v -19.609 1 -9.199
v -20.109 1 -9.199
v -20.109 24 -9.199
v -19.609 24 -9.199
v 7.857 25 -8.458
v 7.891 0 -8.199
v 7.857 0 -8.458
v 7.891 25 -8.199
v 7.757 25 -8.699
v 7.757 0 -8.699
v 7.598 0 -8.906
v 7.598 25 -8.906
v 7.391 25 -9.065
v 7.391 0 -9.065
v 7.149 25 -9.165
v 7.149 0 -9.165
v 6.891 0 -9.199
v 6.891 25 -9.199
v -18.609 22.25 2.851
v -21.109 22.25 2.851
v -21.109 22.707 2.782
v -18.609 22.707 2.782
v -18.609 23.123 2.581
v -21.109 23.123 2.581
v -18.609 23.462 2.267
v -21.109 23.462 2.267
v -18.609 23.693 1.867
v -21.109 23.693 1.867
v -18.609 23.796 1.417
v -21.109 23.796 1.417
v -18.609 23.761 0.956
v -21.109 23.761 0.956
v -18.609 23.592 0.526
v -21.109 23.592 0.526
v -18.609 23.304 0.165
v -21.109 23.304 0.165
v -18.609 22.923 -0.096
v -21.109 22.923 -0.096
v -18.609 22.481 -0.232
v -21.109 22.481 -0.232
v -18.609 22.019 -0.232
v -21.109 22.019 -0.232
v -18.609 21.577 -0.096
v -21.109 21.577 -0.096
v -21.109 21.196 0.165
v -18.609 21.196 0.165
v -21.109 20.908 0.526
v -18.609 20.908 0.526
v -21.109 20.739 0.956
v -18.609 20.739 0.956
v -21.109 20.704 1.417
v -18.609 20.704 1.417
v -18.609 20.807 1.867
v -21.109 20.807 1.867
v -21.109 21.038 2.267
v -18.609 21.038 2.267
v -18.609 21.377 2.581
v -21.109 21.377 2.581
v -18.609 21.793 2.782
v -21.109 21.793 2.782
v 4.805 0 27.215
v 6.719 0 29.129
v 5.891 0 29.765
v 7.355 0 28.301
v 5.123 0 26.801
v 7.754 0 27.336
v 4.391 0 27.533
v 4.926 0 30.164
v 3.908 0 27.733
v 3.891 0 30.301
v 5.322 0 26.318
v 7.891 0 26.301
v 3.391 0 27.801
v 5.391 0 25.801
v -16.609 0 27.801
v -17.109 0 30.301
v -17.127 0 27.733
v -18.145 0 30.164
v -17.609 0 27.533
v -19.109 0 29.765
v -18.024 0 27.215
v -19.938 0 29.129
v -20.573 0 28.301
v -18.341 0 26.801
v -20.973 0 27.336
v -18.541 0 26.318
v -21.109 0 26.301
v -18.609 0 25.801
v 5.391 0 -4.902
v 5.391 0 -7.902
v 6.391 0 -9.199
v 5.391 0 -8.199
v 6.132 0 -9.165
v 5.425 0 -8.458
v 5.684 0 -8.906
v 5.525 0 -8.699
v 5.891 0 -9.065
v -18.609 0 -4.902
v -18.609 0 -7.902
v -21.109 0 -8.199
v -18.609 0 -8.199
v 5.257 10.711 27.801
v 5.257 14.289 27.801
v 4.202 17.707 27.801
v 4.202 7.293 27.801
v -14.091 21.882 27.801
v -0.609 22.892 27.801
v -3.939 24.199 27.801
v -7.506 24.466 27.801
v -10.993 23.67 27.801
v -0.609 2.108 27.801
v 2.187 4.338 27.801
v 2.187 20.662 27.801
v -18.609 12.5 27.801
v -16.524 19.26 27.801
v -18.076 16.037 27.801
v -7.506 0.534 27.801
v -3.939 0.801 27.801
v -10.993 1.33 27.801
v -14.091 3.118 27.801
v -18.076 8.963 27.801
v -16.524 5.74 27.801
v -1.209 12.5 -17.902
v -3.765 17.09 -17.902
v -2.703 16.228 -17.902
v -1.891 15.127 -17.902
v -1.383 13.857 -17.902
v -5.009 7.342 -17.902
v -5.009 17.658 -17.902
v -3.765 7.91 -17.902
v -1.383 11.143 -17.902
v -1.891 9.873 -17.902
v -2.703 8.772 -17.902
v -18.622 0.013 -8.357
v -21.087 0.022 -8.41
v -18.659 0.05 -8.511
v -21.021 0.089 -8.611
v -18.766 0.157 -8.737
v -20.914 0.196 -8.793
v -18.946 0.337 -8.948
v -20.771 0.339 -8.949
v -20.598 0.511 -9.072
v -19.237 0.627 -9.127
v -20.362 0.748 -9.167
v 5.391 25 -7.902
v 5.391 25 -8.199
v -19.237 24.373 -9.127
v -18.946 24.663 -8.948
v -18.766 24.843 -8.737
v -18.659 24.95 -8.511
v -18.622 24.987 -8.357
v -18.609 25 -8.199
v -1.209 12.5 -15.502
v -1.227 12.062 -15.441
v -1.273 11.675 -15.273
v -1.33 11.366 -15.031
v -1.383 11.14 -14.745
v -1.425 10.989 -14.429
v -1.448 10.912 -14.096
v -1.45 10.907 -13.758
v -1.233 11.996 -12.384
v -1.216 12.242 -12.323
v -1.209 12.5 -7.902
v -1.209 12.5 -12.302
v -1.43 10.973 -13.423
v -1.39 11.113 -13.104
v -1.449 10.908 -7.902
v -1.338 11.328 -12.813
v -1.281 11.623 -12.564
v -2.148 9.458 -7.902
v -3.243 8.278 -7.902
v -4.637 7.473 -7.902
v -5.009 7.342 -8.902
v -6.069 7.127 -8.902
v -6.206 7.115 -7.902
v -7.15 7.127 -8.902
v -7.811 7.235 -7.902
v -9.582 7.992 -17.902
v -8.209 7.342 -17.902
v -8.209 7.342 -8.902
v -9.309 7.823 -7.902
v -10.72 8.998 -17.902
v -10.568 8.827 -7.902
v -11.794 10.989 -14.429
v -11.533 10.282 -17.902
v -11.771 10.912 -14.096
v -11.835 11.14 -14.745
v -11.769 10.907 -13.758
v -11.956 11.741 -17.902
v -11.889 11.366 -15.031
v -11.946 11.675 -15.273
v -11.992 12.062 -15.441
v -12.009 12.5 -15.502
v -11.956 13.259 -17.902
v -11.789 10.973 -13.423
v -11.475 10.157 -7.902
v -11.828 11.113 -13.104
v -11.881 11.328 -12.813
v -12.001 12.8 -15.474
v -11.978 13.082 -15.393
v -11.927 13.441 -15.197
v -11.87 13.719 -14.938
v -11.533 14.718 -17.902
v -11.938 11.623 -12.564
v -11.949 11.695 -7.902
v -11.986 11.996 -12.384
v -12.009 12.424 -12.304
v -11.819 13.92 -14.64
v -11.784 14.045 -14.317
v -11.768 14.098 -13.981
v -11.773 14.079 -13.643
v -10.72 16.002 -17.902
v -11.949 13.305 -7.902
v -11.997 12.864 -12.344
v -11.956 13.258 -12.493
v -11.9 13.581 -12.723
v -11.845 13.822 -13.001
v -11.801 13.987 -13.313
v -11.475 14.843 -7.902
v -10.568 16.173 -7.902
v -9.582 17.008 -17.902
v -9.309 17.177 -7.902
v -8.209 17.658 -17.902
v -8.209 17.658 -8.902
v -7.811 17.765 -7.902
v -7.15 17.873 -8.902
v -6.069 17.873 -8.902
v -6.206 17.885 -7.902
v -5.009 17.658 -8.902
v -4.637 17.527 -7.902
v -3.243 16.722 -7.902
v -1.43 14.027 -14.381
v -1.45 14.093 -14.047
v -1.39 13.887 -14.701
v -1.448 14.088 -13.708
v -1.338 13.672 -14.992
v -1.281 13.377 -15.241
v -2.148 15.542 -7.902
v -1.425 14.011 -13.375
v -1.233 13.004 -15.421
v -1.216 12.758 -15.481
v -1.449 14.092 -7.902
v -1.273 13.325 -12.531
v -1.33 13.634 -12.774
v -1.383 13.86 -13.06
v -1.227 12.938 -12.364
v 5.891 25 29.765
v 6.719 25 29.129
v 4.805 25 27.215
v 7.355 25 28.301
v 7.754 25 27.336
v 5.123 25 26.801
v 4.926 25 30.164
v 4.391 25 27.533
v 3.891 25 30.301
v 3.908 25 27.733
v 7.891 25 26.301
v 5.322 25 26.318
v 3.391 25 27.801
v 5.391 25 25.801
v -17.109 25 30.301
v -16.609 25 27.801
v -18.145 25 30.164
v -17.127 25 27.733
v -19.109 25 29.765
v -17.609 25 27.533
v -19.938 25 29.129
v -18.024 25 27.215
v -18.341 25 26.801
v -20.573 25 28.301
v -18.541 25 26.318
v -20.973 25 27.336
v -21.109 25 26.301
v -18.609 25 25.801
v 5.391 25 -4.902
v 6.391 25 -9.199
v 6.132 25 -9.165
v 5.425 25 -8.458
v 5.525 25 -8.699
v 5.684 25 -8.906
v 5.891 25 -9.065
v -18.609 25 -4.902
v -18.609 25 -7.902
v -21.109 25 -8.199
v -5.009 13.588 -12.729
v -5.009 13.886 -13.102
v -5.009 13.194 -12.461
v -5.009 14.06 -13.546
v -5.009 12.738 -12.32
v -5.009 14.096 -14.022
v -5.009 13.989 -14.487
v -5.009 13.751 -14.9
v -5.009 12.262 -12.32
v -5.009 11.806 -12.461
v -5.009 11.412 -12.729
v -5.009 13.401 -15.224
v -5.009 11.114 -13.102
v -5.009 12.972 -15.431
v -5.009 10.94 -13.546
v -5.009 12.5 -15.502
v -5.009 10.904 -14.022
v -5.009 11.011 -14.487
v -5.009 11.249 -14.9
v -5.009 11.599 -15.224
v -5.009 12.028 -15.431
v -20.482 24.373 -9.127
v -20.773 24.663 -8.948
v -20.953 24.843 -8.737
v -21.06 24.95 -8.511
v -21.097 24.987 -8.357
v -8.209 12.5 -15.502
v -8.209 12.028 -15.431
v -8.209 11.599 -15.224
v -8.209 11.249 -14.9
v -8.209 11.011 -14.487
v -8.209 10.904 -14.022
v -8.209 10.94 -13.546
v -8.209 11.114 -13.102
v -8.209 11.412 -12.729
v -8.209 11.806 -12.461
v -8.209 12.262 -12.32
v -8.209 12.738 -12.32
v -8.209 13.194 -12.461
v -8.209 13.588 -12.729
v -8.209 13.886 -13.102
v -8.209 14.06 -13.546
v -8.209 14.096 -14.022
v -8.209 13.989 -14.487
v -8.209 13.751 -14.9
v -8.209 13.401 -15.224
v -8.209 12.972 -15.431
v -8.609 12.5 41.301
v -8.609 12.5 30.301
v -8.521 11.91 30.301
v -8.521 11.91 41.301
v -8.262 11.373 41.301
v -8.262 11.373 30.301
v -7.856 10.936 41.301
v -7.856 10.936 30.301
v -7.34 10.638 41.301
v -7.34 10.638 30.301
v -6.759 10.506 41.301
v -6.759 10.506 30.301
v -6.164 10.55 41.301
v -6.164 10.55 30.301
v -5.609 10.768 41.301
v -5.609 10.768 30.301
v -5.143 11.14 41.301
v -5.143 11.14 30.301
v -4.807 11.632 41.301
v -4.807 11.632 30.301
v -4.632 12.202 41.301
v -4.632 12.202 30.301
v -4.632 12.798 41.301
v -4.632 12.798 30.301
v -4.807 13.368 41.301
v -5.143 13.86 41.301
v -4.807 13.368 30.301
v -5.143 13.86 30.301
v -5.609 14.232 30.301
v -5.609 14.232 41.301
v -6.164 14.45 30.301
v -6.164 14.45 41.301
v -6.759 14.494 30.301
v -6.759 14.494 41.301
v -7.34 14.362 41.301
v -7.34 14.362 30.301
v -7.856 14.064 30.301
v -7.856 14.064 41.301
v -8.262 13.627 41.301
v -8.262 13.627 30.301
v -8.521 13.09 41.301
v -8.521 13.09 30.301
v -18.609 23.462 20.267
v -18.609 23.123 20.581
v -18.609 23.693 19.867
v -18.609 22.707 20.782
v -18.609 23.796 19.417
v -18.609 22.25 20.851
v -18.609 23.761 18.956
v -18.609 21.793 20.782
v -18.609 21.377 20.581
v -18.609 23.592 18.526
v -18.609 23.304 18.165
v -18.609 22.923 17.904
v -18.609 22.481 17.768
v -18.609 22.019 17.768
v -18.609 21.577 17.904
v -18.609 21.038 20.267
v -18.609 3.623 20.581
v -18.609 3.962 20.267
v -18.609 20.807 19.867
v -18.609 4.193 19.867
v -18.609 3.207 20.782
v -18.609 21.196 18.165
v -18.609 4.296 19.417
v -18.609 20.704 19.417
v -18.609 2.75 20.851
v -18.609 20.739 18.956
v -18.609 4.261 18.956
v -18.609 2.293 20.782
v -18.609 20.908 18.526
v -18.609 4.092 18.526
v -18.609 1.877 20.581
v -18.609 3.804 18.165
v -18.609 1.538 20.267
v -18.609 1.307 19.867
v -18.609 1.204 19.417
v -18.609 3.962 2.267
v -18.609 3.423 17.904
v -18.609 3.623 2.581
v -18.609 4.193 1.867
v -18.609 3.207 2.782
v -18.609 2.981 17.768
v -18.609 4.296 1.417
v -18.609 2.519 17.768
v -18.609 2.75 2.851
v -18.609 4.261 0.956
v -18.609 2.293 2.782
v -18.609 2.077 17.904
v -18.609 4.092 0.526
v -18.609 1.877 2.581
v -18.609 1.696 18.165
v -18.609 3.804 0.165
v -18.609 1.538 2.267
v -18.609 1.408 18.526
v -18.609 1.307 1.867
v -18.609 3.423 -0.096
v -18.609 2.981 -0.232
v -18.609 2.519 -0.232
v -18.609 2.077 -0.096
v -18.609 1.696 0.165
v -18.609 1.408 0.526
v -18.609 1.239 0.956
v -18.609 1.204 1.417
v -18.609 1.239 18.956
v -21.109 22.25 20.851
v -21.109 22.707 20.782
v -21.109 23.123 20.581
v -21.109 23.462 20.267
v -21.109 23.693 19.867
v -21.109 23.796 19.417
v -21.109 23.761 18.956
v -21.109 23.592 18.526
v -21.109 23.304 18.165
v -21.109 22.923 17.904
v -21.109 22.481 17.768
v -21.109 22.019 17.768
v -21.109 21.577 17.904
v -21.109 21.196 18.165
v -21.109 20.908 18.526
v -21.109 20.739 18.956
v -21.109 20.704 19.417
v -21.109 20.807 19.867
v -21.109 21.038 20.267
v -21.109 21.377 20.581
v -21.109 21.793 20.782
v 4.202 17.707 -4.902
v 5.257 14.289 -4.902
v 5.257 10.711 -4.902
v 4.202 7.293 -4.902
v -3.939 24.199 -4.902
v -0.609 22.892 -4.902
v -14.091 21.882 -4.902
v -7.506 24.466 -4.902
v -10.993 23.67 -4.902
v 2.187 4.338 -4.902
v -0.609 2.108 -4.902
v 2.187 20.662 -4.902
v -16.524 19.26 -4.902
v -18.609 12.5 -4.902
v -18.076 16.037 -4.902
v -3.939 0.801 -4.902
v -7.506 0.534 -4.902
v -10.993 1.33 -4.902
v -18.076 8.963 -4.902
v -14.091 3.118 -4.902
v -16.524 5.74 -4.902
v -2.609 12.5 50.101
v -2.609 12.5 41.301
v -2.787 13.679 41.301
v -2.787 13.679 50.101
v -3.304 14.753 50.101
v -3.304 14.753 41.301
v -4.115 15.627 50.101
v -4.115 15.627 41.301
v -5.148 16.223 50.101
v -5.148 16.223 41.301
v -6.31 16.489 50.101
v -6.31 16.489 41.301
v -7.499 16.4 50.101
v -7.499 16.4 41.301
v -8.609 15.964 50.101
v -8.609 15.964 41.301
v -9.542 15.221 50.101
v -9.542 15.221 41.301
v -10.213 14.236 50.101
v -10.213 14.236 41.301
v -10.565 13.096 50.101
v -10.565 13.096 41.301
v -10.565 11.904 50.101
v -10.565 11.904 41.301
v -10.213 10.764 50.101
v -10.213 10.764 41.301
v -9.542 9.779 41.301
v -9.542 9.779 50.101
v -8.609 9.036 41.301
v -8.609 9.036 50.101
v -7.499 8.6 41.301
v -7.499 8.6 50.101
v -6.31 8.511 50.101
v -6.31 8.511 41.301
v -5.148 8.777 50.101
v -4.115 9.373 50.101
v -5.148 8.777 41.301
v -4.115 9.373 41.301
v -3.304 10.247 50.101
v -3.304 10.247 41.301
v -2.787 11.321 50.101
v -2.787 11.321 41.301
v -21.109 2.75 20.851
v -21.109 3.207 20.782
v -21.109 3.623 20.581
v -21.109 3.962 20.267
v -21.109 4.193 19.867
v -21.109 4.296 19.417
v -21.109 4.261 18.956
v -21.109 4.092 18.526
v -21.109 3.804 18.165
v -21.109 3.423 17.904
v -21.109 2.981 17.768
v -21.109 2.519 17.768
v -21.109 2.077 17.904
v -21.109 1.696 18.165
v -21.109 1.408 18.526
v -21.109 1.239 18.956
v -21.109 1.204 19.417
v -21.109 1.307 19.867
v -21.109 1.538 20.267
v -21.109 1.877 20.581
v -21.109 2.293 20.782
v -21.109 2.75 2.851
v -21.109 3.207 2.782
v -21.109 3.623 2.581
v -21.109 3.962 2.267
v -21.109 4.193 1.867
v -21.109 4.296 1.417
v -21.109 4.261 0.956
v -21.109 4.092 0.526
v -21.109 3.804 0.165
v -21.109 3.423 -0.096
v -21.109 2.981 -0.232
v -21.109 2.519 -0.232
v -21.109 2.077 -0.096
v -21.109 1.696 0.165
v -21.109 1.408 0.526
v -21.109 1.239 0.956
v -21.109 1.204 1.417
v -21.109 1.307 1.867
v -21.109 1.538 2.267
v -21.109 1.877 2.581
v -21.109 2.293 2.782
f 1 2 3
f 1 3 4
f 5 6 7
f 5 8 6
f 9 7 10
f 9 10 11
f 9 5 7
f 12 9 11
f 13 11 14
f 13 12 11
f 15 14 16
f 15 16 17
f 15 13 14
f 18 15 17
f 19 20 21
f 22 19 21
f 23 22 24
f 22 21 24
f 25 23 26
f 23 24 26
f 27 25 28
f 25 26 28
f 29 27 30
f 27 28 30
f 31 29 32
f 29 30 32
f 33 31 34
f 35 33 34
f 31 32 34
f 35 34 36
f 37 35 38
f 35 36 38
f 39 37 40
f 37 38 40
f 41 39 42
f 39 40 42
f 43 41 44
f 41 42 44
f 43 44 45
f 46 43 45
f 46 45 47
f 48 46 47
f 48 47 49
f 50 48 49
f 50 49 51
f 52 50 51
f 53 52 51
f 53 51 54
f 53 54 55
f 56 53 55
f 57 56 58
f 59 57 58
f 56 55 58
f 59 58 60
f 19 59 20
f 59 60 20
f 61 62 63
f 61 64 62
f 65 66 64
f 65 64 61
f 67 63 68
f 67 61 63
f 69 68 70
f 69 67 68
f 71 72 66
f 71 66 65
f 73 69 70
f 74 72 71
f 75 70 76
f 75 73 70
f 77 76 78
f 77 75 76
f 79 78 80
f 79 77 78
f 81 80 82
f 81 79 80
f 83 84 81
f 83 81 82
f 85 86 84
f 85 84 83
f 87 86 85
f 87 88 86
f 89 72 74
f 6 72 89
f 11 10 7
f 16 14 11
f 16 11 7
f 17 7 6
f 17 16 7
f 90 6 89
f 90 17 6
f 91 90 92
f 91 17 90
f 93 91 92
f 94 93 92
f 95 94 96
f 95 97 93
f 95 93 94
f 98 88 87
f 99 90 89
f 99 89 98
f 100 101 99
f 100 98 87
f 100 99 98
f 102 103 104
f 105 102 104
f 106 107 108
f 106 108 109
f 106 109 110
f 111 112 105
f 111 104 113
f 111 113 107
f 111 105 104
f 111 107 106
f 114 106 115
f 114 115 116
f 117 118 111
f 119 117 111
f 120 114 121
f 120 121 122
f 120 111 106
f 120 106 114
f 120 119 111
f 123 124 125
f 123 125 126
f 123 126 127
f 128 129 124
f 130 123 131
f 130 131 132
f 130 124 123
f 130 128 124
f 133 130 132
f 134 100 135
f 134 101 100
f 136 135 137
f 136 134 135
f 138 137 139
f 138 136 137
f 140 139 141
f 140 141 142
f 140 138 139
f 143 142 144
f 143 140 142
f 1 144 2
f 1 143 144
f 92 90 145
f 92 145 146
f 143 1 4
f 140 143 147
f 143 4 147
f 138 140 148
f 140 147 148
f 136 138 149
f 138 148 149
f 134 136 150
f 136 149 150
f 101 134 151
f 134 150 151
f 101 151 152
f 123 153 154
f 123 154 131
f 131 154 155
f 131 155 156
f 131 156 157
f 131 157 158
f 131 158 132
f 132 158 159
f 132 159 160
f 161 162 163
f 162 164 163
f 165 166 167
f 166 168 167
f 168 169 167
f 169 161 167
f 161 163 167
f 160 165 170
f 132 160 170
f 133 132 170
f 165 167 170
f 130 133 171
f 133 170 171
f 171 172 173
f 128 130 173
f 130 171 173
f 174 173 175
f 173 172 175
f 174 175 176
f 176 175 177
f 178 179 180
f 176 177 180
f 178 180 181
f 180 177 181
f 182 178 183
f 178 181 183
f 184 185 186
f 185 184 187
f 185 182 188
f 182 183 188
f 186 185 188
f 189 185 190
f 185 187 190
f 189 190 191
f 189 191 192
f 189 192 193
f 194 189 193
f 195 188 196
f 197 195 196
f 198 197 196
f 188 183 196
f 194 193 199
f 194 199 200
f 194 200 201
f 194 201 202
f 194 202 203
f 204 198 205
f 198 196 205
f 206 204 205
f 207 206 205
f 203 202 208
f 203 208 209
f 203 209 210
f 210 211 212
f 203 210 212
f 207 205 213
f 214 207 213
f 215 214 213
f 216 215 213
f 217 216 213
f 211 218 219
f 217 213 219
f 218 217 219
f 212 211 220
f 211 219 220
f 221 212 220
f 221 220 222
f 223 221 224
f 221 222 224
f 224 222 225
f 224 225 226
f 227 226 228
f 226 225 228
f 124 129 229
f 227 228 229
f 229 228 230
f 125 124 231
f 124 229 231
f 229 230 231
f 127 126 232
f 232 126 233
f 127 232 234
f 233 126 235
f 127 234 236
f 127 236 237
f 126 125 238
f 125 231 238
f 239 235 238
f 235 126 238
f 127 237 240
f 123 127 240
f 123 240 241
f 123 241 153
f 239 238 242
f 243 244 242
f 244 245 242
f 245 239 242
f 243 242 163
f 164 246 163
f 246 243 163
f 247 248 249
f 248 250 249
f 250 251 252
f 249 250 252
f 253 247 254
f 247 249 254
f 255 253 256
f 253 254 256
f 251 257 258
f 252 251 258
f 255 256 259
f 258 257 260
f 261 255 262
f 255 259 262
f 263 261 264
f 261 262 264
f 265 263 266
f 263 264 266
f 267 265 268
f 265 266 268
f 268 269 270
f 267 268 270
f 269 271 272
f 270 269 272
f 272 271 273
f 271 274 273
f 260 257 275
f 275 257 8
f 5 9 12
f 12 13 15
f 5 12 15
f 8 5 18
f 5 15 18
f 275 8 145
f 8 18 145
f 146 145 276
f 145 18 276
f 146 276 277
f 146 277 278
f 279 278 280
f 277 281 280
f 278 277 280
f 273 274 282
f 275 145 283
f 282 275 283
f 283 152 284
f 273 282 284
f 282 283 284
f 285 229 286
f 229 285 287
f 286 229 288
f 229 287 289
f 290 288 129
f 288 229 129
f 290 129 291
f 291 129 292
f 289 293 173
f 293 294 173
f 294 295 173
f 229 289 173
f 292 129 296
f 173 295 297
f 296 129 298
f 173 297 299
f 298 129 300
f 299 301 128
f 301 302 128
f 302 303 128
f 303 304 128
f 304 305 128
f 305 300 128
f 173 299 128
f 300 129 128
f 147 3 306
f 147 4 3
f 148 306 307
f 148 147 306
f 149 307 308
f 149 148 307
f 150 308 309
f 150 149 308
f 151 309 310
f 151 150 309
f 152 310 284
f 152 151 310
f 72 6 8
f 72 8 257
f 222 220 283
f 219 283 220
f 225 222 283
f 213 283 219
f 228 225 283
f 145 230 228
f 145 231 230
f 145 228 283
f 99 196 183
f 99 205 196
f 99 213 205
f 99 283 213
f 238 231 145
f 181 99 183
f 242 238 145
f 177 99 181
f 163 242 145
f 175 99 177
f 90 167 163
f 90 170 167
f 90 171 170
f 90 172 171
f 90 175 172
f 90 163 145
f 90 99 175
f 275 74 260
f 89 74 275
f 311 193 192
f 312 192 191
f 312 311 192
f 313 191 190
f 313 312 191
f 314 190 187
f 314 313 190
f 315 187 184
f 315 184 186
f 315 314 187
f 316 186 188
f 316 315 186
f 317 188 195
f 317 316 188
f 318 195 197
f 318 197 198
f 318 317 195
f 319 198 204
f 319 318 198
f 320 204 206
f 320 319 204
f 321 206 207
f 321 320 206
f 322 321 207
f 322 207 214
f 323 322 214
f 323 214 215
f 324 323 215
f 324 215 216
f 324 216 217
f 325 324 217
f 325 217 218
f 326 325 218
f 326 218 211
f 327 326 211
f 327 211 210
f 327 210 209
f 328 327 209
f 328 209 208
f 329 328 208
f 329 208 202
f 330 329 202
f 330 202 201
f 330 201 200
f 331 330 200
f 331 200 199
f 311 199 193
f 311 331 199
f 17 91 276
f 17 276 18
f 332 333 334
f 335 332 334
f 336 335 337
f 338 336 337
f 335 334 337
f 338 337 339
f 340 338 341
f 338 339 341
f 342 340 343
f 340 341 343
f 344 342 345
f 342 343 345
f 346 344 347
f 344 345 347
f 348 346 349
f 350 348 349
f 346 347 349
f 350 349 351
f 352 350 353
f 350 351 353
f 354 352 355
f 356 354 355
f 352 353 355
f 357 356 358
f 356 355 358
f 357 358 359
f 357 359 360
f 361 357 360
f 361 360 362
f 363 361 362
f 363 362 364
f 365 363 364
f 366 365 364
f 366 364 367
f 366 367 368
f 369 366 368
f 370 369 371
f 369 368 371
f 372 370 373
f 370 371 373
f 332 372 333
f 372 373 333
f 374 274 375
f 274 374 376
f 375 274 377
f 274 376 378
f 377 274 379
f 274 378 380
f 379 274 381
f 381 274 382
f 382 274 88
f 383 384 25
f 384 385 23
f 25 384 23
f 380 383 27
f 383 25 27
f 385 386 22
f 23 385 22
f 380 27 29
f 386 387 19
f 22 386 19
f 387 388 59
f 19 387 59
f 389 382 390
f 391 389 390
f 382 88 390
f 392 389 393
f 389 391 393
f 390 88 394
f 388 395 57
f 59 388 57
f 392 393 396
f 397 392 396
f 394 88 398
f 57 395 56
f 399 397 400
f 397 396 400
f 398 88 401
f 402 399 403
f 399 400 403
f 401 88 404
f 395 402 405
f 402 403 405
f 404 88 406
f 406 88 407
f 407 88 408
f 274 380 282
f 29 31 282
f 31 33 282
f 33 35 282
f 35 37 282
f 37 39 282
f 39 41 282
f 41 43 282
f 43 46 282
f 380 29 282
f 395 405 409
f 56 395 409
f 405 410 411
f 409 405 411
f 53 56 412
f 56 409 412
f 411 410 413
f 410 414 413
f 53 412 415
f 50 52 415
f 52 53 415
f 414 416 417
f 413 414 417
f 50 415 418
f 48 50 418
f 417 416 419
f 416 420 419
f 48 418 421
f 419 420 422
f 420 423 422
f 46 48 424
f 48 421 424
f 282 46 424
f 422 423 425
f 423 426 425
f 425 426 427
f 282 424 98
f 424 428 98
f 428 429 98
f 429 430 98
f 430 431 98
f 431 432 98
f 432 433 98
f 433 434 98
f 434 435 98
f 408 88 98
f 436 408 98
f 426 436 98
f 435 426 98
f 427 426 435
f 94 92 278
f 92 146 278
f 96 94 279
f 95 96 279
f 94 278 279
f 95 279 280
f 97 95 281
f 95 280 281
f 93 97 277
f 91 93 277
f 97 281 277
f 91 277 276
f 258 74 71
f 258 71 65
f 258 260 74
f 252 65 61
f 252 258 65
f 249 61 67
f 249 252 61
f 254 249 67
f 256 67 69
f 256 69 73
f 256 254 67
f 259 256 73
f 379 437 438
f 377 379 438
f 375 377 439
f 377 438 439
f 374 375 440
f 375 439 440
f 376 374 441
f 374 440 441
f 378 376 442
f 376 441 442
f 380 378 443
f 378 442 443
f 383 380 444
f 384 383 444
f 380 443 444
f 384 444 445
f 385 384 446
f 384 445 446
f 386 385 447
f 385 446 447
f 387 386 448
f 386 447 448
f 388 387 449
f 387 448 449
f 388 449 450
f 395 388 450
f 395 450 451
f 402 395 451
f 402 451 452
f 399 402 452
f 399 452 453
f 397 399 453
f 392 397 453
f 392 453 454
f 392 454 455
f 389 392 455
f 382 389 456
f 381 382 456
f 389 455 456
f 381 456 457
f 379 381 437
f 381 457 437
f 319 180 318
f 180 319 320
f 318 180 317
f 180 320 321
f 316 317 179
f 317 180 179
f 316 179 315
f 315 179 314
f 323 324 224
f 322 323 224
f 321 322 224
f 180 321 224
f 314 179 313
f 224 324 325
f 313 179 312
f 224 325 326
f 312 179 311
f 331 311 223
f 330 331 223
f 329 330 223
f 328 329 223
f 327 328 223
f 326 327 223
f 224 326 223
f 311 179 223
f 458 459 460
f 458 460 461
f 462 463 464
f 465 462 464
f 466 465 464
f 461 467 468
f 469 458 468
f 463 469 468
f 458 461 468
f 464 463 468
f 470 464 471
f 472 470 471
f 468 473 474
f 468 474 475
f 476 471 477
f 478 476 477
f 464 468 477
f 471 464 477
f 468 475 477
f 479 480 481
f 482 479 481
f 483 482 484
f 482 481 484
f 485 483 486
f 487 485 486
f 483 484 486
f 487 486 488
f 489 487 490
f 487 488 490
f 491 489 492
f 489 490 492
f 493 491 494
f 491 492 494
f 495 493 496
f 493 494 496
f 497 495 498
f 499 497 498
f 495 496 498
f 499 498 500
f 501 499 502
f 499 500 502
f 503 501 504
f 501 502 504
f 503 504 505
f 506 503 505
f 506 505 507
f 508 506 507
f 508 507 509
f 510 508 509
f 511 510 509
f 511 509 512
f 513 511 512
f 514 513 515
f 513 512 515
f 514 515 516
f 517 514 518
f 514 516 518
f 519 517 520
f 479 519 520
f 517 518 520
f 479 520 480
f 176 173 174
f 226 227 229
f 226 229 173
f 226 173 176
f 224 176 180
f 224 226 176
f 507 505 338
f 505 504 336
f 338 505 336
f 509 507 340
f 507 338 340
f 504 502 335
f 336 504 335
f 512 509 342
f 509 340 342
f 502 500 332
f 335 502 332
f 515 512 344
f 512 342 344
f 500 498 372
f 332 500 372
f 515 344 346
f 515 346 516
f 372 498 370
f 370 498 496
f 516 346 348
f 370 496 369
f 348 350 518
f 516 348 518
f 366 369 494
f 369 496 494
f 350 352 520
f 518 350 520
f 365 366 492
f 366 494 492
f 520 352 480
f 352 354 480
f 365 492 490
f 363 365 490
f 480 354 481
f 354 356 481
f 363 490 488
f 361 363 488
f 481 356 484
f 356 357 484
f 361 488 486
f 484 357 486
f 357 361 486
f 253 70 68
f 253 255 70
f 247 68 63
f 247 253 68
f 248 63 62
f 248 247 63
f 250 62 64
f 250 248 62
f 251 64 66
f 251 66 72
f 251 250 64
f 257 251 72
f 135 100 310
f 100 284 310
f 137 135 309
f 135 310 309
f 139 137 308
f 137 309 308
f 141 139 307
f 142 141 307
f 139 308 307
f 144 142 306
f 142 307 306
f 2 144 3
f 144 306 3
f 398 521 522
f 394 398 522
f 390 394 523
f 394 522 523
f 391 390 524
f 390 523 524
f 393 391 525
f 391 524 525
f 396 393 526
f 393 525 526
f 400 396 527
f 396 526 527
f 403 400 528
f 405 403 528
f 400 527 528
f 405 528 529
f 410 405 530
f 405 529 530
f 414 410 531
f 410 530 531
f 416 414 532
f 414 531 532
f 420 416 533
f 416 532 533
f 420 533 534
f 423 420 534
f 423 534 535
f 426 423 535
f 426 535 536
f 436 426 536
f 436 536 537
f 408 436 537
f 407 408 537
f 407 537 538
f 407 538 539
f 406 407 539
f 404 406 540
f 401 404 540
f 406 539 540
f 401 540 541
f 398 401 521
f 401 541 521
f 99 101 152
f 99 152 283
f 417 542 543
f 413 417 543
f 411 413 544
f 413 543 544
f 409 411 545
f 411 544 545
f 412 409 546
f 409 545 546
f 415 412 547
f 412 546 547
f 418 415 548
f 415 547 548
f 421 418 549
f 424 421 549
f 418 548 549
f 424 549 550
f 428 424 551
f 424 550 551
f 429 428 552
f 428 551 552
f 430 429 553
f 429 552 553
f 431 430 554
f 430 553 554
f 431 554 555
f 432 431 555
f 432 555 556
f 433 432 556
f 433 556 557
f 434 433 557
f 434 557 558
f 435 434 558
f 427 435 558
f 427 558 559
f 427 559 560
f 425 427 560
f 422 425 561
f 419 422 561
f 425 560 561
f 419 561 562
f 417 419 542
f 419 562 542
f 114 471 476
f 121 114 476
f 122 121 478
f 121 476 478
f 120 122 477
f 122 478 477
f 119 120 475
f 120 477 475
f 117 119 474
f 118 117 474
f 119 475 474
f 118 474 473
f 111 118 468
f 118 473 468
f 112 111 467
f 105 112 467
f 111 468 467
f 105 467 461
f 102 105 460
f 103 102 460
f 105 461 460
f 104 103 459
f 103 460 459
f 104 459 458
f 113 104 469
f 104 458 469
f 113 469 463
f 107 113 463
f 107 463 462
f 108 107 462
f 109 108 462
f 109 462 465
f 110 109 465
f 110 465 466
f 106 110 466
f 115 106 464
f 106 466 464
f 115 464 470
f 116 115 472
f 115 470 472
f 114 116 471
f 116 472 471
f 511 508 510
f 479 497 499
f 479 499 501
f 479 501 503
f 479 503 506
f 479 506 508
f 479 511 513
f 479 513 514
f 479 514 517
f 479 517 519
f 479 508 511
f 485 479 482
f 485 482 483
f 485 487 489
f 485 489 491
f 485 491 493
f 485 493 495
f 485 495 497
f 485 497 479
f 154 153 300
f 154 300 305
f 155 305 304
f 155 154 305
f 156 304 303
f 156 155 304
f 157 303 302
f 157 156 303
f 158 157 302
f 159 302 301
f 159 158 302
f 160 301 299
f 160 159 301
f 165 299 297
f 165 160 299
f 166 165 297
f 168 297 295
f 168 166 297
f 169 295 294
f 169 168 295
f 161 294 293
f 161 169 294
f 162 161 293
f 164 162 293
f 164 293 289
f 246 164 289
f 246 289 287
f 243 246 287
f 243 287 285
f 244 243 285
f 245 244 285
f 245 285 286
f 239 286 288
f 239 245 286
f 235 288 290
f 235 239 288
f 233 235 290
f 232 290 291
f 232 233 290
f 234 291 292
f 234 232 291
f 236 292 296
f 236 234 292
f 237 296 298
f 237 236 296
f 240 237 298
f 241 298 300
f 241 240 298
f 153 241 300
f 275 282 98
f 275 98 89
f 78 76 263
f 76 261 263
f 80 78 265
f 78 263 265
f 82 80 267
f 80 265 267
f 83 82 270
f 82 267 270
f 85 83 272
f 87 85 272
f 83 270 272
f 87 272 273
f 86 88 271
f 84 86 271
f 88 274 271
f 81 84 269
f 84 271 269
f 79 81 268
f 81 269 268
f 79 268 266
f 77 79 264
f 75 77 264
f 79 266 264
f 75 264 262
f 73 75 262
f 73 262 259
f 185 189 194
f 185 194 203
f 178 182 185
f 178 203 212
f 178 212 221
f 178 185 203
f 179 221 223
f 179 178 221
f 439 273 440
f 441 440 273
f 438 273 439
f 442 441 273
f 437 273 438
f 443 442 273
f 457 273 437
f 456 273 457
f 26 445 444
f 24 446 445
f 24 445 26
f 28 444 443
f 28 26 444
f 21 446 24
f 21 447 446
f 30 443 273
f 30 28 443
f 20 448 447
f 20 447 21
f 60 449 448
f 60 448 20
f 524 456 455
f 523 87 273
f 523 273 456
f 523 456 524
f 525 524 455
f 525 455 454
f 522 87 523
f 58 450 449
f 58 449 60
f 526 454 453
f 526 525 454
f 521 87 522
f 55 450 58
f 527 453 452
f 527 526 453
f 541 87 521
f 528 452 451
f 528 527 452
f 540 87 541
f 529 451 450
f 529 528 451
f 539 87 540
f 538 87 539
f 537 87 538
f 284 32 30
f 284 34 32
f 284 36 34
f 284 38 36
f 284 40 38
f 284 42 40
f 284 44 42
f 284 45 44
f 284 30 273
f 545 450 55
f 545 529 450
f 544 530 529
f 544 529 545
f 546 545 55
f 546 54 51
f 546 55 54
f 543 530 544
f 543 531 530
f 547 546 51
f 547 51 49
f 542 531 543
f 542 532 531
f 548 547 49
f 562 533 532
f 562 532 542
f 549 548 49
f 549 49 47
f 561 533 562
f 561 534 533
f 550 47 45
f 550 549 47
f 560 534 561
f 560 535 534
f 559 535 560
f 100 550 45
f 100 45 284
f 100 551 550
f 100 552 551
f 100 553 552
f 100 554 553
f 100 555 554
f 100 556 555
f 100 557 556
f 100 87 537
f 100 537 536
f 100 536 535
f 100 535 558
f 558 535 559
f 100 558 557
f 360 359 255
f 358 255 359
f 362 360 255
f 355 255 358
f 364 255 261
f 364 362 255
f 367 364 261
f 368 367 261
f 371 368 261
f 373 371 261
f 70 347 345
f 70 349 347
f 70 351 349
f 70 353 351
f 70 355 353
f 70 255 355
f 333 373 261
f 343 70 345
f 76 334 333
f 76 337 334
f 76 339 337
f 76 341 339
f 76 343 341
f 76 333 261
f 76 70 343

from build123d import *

# Parameters (mm, degrees)
SKETCH1_W               = 24
SKETCH1_H               = 32.703125
BOSS_EXTRUDE1_DEPTH     = 25
SKETCH3_R               = 12
BOSS_EXTRUDE7_DEPTH     = 32.703125
SKETCH4_R               = 2
BOSS_EXTRUDE8_DEPTH     = 11
SKETCH5_R               = 4
BOSS_EXTRUDE9_DEPTH     = 8.8
SKETCH6_R               = 1.55
CUT_EXTRUDE1_DEPTH      = 2.5
SKETCH7_R               = 5.4
BOSS_EXTRUDE10_DEPTH    = 10
CUT_EXTRUDE2_DEPTH      = 9
CUT_EXTRUDE3_DEPTH      = 9
CUT_EXTRUDE3_DEPTH_BACK = 9
SKETCH10_R              = 1.6
FILLET1_R               = 4
FILLET2_R               = 2
FILLET3_R               = 1


with BuildPart() as part:
    # Sketch1 → Boss-Extrude1 (new body)
    with BuildSketch(Plane(origin=(0, 0, 0), x_dir=(1, 0, 0), z_dir=(0, 1, 0))):
        Polygon((-21.109375, 9.19921875), (-18.609375, 9.19921875), (-18.609375, 7.90234375), (5.390625, 7.90234375), (5.390625, 9.19921875), (7.890625, 9.19921875), (7.890625, -30.30078125), (-21.109375, -30.30078125), align=None)
        with Locations((-6.609375, -11.44921875)):
            Rectangle(SKETCH1_W, SKETCH1_H, mode=Mode.SUBTRACT)
    extrude(amount=BOSS_EXTRUDE1_DEPTH)

    # Sketch4 → Boss-Extrude8 (add)
    with BuildSketch(Plane.XY.offset(30.30078125)):
        with Locations(Location((-6.609375, 12.5, 0), (0, 0, 180))):
            Circle(SKETCH4_R)
    extrude(amount=BOSS_EXTRUDE8_DEPTH)

    # Sketch5 → Boss-Extrude9 (add)
    with BuildSketch(Plane.XY.offset(41.30078125)):
        with Locations((-6.609375, 12.5)):
            Circle(SKETCH5_R)
    extrude(amount=BOSS_EXTRUDE9_DEPTH)

    # Sketch6 → Cut-Extrude1 (cut)
    with BuildSketch(Plane.ZY.offset(21.109375)):
        with Locations((1.30078125, 2.75)):
            Circle(SKETCH6_R)
        with Locations((1.30078125, 22.25)):
            Circle(SKETCH6_R)
        with Locations((19.30078125, 22.25)):
            Circle(SKETCH6_R)
        with Locations((19.30078125, 2.75)):
            Circle(SKETCH6_R)
    extrude(amount=-CUT_EXTRUDE1_DEPTH, mode=Mode.SUBTRACT)

    # Sketch7 → Boss-Extrude10 (add)
    with BuildSketch(Plane(origin=(0, 0, -7.90234375), x_dir=(-1, 0, 0), z_dir=(0, 0, -1))):
        with Locations(Location((6.609375, 12.5, 0), (0, 0, 180))):
            Circle(SKETCH7_R)
    extrude(amount=BOSS_EXTRUDE10_DEPTH)

    # Sketch8 → Cut-Extrude2 (cut)
    with BuildSketch(Plane(origin=(0, 0, -17.90234375), x_dir=(-1, 0, 0), z_dir=(0, 0, -1))):
        Polygon((6.609375, 6.57164194), (8.209375, 6.57164194), (8.209375, 21.141508998), (5.009375, 21.141508998), (5.009375, 6.57164194), align=None)
    extrude(amount=-CUT_EXTRUDE2_DEPTH, mode=Mode.SUBTRACT)

    # Sketch10 → Cut-Extrude3 (cut, two sides: drawn at the far end of the back side and taken through both)
    with BuildSketch(Plane.ZY.offset(5.009375).offset(-CUT_EXTRUDE3_DEPTH_BACK)):
        with Locations(Location((-13.90234375, 12.5, 0), (0, 0, 180))):
            Circle(SKETCH10_R)
    extrude(amount=CUT_EXTRUDE3_DEPTH + CUT_EXTRUDE3_DEPTH_BACK, mode=Mode.SUBTRACT)

    # Fillet1
    fillet1_edges = [part.edges().sort_by_distance(p)[0] for p in [
        (7.890625, 12.5, 30.30078125),
        (-21.109375, 12.5, 30.30078125),
    ]]
    fillet(fillet1_edges, radius=FILLET1_R)

    # Fillet2
    fillet2_edges = [part.edges().sort_by_distance(p)[0] for p in [
        (-18.609375, 12.5, 27.80078125),
        (5.390625, 12.5, 27.80078125),
    ]]
    fillet(fillet2_edges, radius=FILLET2_R)

    # Fillet3
    fillet3_edges = [part.edges().sort_by_distance(p)[0] for p in [
        (-18.609375, 12.5, -9.19921875),
        (-19.859375, 25, -9.19921875),
        (-21.109375, 12.5, -9.19921875),
        (-19.859375, 0, -9.19921875),
        (5.390625, 12.5, -9.19921875),
        (7.890625, 12.5, -9.19921875),
    ]]
    fillet(fillet3_edges, radius=FILLET3_R)


with BuildPart() as body_2:
    # Sketch3 → Boss-Extrude7 (new body)
    with BuildSketch(Plane.XY.offset(-4.90234375)):
        with Locations(Location((-6.609375, 12.5, 0), (0, 0, 180))):
            Circle(SKETCH3_R)
    extrude(amount=BOSS_EXTRUDE7_DEPTH)


solid = Compound([part.part, body_2.part])
